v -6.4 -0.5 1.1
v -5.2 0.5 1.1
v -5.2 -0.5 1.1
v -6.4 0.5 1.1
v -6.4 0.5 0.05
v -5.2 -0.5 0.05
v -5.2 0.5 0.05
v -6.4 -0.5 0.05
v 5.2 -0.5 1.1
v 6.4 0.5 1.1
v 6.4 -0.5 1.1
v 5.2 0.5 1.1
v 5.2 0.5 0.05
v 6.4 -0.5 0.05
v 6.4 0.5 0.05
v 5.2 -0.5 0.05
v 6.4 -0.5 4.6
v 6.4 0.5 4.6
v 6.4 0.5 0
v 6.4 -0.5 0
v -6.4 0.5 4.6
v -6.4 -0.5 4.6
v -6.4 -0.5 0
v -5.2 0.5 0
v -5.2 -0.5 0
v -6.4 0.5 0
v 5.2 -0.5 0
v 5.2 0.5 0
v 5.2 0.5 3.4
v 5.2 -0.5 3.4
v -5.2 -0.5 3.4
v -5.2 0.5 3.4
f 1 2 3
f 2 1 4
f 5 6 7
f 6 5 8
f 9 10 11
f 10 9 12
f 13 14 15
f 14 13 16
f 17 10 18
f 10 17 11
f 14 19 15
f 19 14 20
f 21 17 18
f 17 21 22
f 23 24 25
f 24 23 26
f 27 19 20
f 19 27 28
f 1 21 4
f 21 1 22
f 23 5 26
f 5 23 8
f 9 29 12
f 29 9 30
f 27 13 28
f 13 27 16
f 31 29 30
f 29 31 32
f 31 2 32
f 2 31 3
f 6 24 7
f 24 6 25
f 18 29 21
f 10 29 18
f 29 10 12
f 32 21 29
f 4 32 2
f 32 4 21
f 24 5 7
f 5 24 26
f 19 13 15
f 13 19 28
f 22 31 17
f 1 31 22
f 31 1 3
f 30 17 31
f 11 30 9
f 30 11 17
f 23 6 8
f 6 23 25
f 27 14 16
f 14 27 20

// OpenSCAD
// file: ../lib/at01_inverted_core_snap.scad
// File: at01_inverted_core_snap.scad
// AT-01 — experiment-owned inverted fixed-core / removable-shell snap.
//
// This geometry does not copy the QuackWorks/OpenGrid snap. It keeps only the
// high-level design lessons: compact fixed side, removable compliant side,
// explicit locating/retention roles, and a Lite-like 4.0 / 3.4 mm Z baseline.

// Fixed-side baseline.
AT01_CORE_SIZE = 10.0;
AT01_CORE_HEIGHT = 4.0;
AT01_ROOT_SHOULDER = 0.6;
AT01_ENGAGEMENT_HEIGHT = 3.4;

// Removable shell.
AT01_CLEARANCE = 0.20;              // per side on nominal 10 x 10 core
AT01_SHELL_WALL = 1.20;
AT01_SHELL_TOP = 1.20;
AT01_SHELL_INNER = AT01_CORE_SIZE + 2 * AT01_CLEARANCE;
AT01_SHELL_OUTER = AT01_SHELL_INNER + 2 * AT01_SHELL_WALL;
AT01_SHELL_HEIGHT = AT01_ENGAGEMENT_HEIGHT + AT01_SHELL_TOP;

// Two-sided retention on +/-X.
AT01_RIB_PROTRUSION = 0.35;
AT01_RIB_WIDTH = 4.0;
AT01_RIB_Z_BOTTOM = 0.75;
AT01_RIB_Z_LOWER_MAX = 0.95;
AT01_RIB_Z_UPPER_MAX = 1.15;
AT01_RIB_Z_TOP = 1.60;

// Receiving window in each compliant shell tongue.
// Values are shell-local; assembled shell starts at Z=AT01_ROOT_SHOULDER.
AT01_WINDOW_WIDTH = 4.8;
AT01_WINDOW_Z_MIN = 0.05;
AT01_WINDOW_Z_MAX = 1.10;

// Two relief slots isolate the center tongue on each +/-X wall.
AT01_FLEX_SLOT_Y = 3.0;
AT01_FLEX_SLOT_WIDTH = 0.8;

// Evidence helpers.
AT01_EXPLODED_Z = 8.0;
AT01_PROFILE_SLICE = 1.0;

assert(
    abs(AT01_ROOT_SHOULDER + AT01_ENGAGEMENT_HEIGHT - AT01_CORE_HEIGHT) < 0.0001,
    "AT-01 Lite baseline must satisfy shoulder + engagement = 4.0 mm."
);
assert(
    abs(AT01_SHELL_INNER - (AT01_CORE_SIZE + 2 * AT01_CLEARANCE)) < 0.0001,
    "AT-01 shell inner size must preserve the stated side clearance."
);

module _at01_positive_x_retention_rib() {
    // Polygon is defined in X/Z and extruded along Y.
    rotate([90, 0, 0])
        linear_extrude(height = AT01_RIB_WIDTH, center = true, convexity = 10)
            polygon(points = [
                [AT01_CORE_SIZE / 2, AT01_RIB_Z_BOTTOM],
                [AT01_CORE_SIZE / 2 + AT01_RIB_PROTRUSION, AT01_RIB_Z_LOWER_MAX],
                [AT01_CORE_SIZE / 2 + AT01_RIB_PROTRUSION, AT01_RIB_Z_UPPER_MAX],
                [AT01_CORE_SIZE / 2, AT01_RIB_Z_TOP]
            ]);
}

module at01_fixed_core() {
    union() {
        translate([-AT01_CORE_SIZE / 2, -AT01_CORE_SIZE / 2, 0])
            cube([AT01_CORE_SIZE, AT01_CORE_SIZE, AT01_CORE_HEIGHT]);

        _at01_positive_x_retention_rib();

        mirror([1, 0, 0])
            _at01_positive_x_retention_rib();
    }
}

module _at01_shell_outer() {
    translate([-AT01_SHELL_OUTER / 2, -AT01_SHELL_OUTER / 2, 0])
        cube([AT01_SHELL_OUTER, AT01_SHELL_OUTER, AT01_SHELL_HEIGHT]);
}

module _at01_shell_cavity() {
    // Ends exactly at the underside of the top plate.
    translate([-AT01_SHELL_INNER / 2, -AT01_SHELL_INNER / 2, -0.05])
        cube([AT01_SHELL_INNER, AT01_SHELL_INNER, AT01_ENGAGEMENT_HEIGHT + 0.05]);
}

module _at01_retention_window(x_sign = 1) {
    wall_center = (AT01_SHELL_INNER / 2 + AT01_SHELL_OUTER / 2) / 2;
    translate([
        x_sign * wall_center,
        0,
        (AT01_WINDOW_Z_MIN + AT01_WINDOW_Z_MAX) / 2
    ])
        cube([
            AT01_SHELL_WALL + 0.4,
            AT01_WINDOW_WIDTH,
            AT01_WINDOW_Z_MAX - AT01_WINDOW_Z_MIN
        ], center = true);
}

module _at01_flex_slot(x_sign = 1, y_sign = 1) {
    wall_center = (AT01_SHELL_INNER / 2 + AT01_SHELL_OUTER / 2) / 2;
    translate([
        x_sign * wall_center,
        y_sign * AT01_FLEX_SLOT_Y,
        AT01_ENGAGEMENT_HEIGHT / 2
    ])
        cube([
            AT01_SHELL_WALL + 0.4,
            AT01_FLEX_SLOT_WIDTH,
            AT01_ENGAGEMENT_HEIGHT + 0.10
        ], center = true);
}

module at01_removable_shell() {
    difference() {
        _at01_shell_outer();
        _at01_shell_cavity();

        for (x_sign = [-1, 1]) {
            _at01_retention_window(x_sign);

            for (y_sign = [-1, 1])
                _at01_flex_slot(x_sign, y_sign);
        }
    }
}

module at01_assembled(shell_alpha = 0.55) {
    color([0.68, 0.70, 0.74])
        at01_fixed_core();

    translate([0, 0, AT01_ROOT_SHOULDER])
        color([0.92, 0.30, 0.12, shell_alpha])
            at01_removable_shell();
}

module at01_exploded() {
    color([0.68, 0.70, 0.74])
        at01_fixed_core();

    translate([0, 0, AT01_ROOT_SHOULDER + AT01_EXPLODED_Z])
        color([0.92, 0.30, 0.12])
            at01_removable_shell();
}

module _at01_retention_slice_volume() {
    translate([-20, -AT01_PROFILE_SLICE / 2, -1])
        cube([40, AT01_PROFILE_SLICE, 12]);
}

module _at01_locating_slice_volume() {
    translate([-AT01_PROFILE_SLICE / 2, -20, -1])
        cube([AT01_PROFILE_SLICE, 40, 12]);
}

module at01_fixed_retention_profile() {
    intersection() {
        at01_fixed_core();
        _at01_retention_slice_volume();
    }
}

module at01_shell_retention_profile() {
    intersection() {
        at01_removable_shell();
        translate([0, 0, -AT01_ROOT_SHOULDER])
            _at01_retention_slice_volume();
    }
}

module at01_fixed_locating_profile() {
    intersection() {
        at01_fixed_core();
        _at01_locating_slice_volume();
    }
}

module at01_shell_locating_profile() {
    intersection() {
        at01_removable_shell();
        translate([0, 0, -AT01_ROOT_SHOULDER])
            _at01_locating_slice_volume();
    }
}

module at01_retention_section() {
    color([0.68, 0.70, 0.74])
        at01_fixed_retention_profile();

    translate([0, 0, AT01_ROOT_SHOULDER])
        color([0.92, 0.30, 0.12])
            at01_shell_retention_profile();
}

module at01_locating_section() {
    color([0.68, 0.70, 0.74])
        at01_fixed_locating_profile();

    translate([0, 0, AT01_ROOT_SHOULDER])
        color([0.92, 0.30, 0.12])
            at01_shell_locating_profile();
}
// main file
include <../lib/at01_inverted_core_snap.scad>
at01_shell_retention_profile();
